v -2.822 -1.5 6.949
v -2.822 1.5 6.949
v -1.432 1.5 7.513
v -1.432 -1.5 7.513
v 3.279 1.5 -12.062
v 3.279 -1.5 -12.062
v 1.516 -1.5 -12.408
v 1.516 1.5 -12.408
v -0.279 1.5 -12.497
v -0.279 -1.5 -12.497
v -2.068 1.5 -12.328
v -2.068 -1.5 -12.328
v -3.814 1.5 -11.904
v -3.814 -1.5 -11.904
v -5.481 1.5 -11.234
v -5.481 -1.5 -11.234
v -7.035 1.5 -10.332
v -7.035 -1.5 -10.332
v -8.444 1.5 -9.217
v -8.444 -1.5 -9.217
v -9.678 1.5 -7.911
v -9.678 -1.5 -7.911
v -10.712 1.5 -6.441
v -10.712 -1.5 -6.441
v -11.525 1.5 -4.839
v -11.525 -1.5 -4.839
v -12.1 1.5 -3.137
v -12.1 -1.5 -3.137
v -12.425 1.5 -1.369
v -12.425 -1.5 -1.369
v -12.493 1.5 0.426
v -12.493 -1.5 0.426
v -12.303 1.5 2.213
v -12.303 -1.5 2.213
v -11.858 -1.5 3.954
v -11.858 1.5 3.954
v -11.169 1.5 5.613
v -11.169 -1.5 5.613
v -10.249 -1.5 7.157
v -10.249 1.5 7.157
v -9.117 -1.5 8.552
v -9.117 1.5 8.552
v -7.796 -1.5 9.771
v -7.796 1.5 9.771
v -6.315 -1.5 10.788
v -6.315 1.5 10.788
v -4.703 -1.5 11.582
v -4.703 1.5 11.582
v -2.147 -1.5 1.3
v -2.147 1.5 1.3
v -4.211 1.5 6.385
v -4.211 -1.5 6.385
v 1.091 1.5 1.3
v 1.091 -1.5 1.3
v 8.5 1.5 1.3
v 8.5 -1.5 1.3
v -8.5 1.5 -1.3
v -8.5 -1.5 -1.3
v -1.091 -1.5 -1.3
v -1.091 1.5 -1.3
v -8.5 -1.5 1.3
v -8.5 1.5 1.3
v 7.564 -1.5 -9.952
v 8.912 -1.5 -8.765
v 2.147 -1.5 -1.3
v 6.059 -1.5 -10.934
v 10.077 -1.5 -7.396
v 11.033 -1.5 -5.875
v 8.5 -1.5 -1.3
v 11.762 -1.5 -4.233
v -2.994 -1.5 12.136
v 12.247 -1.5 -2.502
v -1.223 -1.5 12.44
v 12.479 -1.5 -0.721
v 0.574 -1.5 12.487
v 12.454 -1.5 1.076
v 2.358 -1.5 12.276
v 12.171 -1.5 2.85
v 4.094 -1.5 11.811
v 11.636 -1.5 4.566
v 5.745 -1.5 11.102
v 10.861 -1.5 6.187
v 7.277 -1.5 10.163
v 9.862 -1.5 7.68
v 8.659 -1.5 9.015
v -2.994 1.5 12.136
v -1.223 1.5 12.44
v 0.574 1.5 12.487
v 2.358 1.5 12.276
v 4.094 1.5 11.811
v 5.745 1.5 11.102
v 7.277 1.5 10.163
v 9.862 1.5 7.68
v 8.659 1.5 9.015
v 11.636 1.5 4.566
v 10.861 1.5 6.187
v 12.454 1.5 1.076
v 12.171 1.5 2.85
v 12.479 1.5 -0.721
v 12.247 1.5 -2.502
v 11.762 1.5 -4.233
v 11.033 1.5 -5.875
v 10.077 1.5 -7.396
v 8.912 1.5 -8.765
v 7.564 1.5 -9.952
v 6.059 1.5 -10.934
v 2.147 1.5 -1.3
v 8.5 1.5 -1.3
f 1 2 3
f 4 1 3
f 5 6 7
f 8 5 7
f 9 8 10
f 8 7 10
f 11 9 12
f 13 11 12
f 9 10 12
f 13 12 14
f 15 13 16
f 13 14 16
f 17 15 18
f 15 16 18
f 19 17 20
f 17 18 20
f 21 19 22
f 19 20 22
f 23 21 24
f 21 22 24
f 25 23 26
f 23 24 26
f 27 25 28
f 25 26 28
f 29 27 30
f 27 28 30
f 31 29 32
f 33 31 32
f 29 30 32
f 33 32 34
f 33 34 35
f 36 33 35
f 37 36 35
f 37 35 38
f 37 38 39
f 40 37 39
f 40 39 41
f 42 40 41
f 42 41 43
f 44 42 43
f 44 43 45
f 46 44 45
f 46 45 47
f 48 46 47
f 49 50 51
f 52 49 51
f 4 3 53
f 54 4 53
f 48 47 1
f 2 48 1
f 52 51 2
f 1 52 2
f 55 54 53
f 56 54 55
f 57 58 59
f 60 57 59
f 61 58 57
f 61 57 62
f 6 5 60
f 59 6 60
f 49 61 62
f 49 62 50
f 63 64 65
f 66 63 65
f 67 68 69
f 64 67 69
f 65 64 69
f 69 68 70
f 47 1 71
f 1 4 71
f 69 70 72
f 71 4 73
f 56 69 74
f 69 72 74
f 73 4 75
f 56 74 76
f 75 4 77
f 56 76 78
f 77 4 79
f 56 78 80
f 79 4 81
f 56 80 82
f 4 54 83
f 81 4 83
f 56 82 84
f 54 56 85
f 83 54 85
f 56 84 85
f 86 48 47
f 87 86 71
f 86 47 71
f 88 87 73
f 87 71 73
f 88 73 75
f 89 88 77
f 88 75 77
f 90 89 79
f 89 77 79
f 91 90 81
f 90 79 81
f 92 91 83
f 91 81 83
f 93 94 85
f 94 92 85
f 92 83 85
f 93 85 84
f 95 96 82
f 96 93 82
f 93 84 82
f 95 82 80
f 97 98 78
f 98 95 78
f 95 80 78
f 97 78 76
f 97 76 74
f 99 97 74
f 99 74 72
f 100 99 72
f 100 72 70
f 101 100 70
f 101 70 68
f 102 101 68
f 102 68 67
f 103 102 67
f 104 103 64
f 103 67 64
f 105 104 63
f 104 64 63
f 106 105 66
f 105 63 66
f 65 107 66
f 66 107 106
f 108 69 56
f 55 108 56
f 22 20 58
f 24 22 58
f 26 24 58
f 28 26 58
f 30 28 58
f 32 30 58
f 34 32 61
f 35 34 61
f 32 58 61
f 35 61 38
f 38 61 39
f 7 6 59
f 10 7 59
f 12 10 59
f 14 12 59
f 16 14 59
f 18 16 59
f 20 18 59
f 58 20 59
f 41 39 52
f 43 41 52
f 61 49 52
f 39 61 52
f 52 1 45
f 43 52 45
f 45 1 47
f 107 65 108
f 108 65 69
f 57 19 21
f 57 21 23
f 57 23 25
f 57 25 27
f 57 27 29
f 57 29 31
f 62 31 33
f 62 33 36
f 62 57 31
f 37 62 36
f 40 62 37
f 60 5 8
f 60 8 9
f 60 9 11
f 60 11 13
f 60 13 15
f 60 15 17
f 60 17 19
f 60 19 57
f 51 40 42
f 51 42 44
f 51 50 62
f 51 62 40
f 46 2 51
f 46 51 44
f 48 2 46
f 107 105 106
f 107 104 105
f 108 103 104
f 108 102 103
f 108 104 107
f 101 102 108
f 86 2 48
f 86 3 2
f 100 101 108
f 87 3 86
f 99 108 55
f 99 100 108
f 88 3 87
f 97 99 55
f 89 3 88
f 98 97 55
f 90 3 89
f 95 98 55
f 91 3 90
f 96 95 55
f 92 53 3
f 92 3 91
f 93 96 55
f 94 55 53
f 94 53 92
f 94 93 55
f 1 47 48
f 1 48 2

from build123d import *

# Parameters (mm, degrees)
BOSS_EXTRUDE1_DEPTH      = 1.5
BOSS_EXTRUDE1_DEPTH_BACK = 1.5
SKETCH1_R                = 12.5
SKETCH2_W                = 17
SKETCH2_H                = 2.6
CUT_EXTRUDE1_DEPTH       = 18.930421077
CUT_EXTRUDE2_DEPTH       = 18.741194999
CUT_EXTRUDE2_DEPTH_BACK  = 18.741194999


with BuildPart() as part:
    # Sketch1 → Boss-Extrude1 (new, two sides: drawn at the far end of the back side and taken through both)
    with BuildSketch(Plane(origin=(0, 0, 0), x_dir=(1, 0, 0), z_dir=(0, 1, 0)).offset(-BOSS_EXTRUDE1_DEPTH_BACK)):
        Circle(SKETCH1_R)
    extrude(amount=BOSS_EXTRUDE1_DEPTH + BOSS_EXTRUDE1_DEPTH_BACK)

    # Sketch2 → Cut-Extrude1 (cut, through all)
    with BuildSketch(Plane.XZ.offset(1.5)):
        Rectangle(SKETCH2_W, SKETCH2_H)
    extrude(amount=-CUT_EXTRUDE1_DEPTH, mode=Mode.SUBTRACT)

    # Sketch3 → Cut-Extrude2 (cut, two sides: drawn at the far end of the back side and taken through both)
    with BuildSketch(Plane.XZ.offset(-CUT_EXTRUDE2_DEPTH_BACK)):
        Polygon((3.313010343, -12.145944281), (-4.21147492, 6.384628337), (-1.431889027, 7.513301126), (6.092596236, -11.017271491), align=None)
    extrude(amount=CUT_EXTRUDE2_DEPTH + CUT_EXTRUDE2_DEPTH_BACK, mode=Mode.SUBTRACT)


with BuildPart() as body_2:
    # Split2: the piece on the far side of the plane
    add(part.part)
    split(bisect_by=Plane(origin=(0, 0, 0), x_dir=(0.3762242631393602, 0, -0.9265286308718395), z_dir=(-0.9265286308718397, 0, -0.37622426313936025)), keep=Keep.BOTTOM)


with BuildPart() as part_1:
    add(part.part)

    # Split2
    split(bisect_by=Plane(origin=(0, 0, 0), x_dir=(0.3762242631393602, 0, -0.9265286308718395), z_dir=(-0.9265286308718397, 0, -0.37622426313936025)), keep=Keep.TOP)


solid = Compound([body_2.part, part_1.part])
